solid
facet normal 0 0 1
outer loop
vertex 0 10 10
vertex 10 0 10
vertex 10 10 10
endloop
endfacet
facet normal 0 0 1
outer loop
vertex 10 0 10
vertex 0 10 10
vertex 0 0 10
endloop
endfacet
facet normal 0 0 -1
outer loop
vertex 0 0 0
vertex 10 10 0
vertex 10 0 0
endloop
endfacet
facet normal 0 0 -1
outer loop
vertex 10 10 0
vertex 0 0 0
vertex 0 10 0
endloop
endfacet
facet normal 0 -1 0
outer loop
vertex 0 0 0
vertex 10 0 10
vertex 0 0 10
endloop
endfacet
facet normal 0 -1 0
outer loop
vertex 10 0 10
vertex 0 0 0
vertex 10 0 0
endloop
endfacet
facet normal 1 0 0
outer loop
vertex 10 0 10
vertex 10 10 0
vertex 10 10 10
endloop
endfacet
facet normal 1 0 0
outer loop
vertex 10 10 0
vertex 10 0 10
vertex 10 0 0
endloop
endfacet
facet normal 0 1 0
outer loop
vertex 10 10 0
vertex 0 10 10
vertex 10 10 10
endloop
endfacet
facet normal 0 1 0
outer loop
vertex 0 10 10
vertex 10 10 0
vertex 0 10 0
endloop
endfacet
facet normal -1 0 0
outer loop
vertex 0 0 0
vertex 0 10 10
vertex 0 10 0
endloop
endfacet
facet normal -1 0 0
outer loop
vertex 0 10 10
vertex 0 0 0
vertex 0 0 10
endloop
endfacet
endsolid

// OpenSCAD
// expect: background only
// fix: translate([20, 0, 0]) cube(5);
cube(10);
%translate([20, 0, 0]) cube(5);
